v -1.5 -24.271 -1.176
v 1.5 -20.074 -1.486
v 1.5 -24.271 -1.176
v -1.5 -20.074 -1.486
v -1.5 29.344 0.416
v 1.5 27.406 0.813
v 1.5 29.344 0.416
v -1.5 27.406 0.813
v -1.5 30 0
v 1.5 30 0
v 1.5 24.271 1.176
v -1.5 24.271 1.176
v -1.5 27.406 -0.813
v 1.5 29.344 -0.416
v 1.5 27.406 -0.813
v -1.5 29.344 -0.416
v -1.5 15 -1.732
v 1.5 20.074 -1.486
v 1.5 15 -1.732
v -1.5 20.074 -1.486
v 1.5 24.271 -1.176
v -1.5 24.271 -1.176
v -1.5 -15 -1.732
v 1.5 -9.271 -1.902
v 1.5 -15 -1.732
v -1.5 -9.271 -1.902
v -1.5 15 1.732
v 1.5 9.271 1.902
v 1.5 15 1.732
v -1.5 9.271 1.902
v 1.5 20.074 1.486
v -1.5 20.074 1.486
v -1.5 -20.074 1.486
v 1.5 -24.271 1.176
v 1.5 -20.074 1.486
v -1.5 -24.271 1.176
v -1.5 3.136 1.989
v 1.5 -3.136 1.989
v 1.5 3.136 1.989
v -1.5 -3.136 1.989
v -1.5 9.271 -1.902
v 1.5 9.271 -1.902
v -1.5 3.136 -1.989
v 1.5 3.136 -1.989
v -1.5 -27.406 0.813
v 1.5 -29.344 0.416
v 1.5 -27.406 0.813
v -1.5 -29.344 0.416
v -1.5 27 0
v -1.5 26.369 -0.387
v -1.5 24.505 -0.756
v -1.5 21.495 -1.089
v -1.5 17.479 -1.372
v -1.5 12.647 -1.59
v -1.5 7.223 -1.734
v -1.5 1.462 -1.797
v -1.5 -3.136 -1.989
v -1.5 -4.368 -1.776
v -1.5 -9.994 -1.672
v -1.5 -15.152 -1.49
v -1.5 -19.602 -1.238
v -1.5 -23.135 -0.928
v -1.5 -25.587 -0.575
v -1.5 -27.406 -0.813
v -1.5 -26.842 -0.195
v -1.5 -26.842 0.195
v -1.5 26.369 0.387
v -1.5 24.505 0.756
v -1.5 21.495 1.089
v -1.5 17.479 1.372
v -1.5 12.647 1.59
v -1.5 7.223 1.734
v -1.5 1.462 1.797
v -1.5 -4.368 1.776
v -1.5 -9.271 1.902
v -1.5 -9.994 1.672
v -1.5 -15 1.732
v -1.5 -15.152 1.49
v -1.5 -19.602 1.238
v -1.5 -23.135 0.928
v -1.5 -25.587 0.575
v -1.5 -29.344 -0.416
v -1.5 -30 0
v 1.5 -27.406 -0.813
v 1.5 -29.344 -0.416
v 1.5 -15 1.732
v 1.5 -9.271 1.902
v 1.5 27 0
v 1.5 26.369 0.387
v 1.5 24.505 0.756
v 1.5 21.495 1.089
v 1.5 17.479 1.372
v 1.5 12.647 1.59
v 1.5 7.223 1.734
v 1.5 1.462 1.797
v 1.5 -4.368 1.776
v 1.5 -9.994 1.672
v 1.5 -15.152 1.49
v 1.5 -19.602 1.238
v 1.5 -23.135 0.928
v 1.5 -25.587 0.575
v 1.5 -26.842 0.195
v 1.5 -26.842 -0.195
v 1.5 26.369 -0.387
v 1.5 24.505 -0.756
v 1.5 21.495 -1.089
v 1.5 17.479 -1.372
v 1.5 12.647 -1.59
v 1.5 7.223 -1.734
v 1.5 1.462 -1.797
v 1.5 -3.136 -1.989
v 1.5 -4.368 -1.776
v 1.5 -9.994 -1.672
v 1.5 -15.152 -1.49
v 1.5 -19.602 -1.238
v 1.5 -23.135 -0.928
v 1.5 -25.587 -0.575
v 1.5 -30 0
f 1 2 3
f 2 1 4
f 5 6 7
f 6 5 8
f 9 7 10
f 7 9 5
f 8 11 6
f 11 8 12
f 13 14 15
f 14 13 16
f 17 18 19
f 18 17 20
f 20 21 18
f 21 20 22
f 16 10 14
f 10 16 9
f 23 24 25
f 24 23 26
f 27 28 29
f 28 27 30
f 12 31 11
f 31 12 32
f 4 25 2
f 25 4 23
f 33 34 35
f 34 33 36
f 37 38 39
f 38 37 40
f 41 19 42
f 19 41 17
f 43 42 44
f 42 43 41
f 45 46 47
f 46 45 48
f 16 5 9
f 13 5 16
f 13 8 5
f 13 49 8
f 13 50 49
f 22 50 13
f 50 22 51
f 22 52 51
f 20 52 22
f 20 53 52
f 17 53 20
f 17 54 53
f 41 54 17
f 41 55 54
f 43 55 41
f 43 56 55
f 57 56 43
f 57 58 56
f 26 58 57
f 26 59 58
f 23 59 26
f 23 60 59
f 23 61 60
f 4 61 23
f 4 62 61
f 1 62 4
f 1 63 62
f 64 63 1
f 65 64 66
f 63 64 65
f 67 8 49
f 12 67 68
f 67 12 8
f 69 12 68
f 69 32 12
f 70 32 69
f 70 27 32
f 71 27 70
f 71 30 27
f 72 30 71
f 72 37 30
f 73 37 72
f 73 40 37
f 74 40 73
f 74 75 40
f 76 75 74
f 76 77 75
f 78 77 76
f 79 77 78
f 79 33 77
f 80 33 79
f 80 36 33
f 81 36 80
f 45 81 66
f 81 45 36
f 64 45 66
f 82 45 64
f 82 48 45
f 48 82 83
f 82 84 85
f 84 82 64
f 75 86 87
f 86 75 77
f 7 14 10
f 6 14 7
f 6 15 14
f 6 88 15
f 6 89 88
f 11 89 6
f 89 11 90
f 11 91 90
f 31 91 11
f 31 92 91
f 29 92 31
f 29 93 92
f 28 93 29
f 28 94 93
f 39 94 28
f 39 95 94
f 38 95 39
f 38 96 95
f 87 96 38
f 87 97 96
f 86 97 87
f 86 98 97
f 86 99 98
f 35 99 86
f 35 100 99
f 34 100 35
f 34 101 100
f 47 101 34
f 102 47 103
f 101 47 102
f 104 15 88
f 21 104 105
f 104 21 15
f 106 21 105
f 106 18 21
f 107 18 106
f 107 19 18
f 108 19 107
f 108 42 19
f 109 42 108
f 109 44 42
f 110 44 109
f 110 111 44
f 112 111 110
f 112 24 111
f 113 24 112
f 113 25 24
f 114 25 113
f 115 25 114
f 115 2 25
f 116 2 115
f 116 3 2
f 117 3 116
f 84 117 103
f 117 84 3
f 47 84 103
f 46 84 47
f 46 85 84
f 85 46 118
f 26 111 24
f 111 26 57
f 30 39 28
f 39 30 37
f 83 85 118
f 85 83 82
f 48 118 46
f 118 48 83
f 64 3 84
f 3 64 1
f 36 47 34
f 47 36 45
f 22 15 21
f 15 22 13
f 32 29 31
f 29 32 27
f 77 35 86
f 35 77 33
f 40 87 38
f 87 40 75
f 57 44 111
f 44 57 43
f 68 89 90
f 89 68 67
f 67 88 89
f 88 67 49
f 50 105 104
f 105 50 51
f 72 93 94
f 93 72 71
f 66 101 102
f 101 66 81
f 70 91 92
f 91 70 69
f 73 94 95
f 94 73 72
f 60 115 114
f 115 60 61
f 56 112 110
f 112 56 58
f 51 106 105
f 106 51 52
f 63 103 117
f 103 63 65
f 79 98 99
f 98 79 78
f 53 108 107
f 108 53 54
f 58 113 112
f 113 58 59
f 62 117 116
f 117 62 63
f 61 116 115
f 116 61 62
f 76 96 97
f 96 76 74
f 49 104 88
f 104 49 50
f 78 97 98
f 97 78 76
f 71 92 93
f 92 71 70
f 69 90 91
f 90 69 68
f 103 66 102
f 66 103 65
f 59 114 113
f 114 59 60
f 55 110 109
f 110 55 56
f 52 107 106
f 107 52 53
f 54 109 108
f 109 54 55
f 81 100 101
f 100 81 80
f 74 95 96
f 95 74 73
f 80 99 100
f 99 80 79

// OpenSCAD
/**
* An edge (or line) between 2 nodes
*/
module line(start, end, d, fn=4) {
  hull() {
    node(start,d, fn);
    node(end,d, fn);
  }      
}

/**
* A single node which is connected by edges
*/
module node(pos, d, fn=4) {
  if (pos[0]!=undef && pos[1] != undef && pos[2] != undef){ 
    translate(pos) sphere(d=d, $fn = fn);    
  }
}

/**
* Basic logic for generating a 3d spring
*/ 
module spring(d, dBottom=6, dTop=6, windings=2, height=10, steps=10, wireDiameter=1,fn=10) {
    // we use either d or dBottom&dTop
    r0 = d != undef ? d/2 : dBottom/2;
    r1 = d != undef ?d/2 : dTop/2;
    
    rx = (r0-r1) / (360.0*windings);    
    heightPerDegree = height/windings/360;
    
    for ( angle = [steps : steps : 360*windings] ){
        r = r0 - (angle * rx); 
        x0=r*cos(angle-steps);
        y0=r*sin(angle-steps);
        z0=(angle-steps)*heightPerDegree;
        x=r*cos(angle);
        y=r*sin(angle);
        z=angle*heightPerDegree;

        line([x0,y0,z0],[x,y,z],d=wireDiameter,fn=fn);        
    }
}

/**
* 3D Spring with identical diameter at top and bottom. The top and boton might
* start with a flat circle
*/
module spring3D(d=5,windings=3,height=10,flatStart=true,flatEnd=true, wireDiameter=1,  fn=4) {  
    spring(d=d, windings=windings,height=height, fn=fn);
    
    if (flatStart)
        spring(dBottom=d,dTop=d,windings=1,height=0, fn=fn);
    if (flatEnd)
        translate([0,0,height]) spring(dBottom=d,dTop=d, windings=1,height=0, fn=fn);

}

/**
* Generate Support for the 3D Spring
*/
module spring3DSupport(d=5,height=10,supportDiameter=0.6, fn=4){
    // generate support
    dist=(d/2)*cos(0);
    translate([0,-dist,0])  cylinder(h=height,d=supportDiameter, $fn=fn);
    translate([0,dist,0])  cylinder(h=height,d=supportDiameter, $fn=fn);
}

/**
* Flat "clock" Spring
*/
module springSpiralTorsion(d=15,innerD=6, windings=5,wireDiameter=0.7,fn=4) {
    // outer ring
    spring(dBottom=d,dTop=d,windings=1,height=0,wireDiameter=wireDiameter,fn=fn);
    // windings
    spring(dBottom=d,dTop=innerD,windings=windings,height=0,wireDiameter=wireDiameter,fn=fn);
    // inner ring
    spring(dBottom=innerD,dTop=innerD,windings=1,height=0,wireDiameter=wireDiameter,fn=fn);
}

/**
* Flat 2d Spring with a sinusoidal shape
*/ 
module springSine(length=20, width=10, windings=4, steps=10, wireDiameter=0.7, fn=4){
    dx = length / (360 * windings);
    for(i = [steps : steps : 360 * windings]){
        x0 = (i-steps) * dx;
        y0 = sin(i-steps) * width/2;
        x = i * dx;
        y = sin(i) * width/2;        
        line([x0,y0,0],[x,y,0],d=wireDiameter,fn=fn);        
    }
}

/**
* Flat 2d Spring with a triangular shape
*/
module springTriangle(length=20, width=10, windings=4, wireDiameter=0.7, fn=4){
    // generate poins only every 90 degrees
    springSine(length=length,width=width, windings=windings, steps=90, wireDiameter=wireDiameter,fn=fn);
}

/**
* An edge (or line) between 2 cylinders
*/
module line3D(start, end,d=1,h=10, fn=4) {
  hull() {
    translate(start) cylinder(h=h, d=d, $fn = fn);    
    translate(end) cylinder(h=h, d=d, $fn = fn);    
  }      
}

/**
* 3d Spring with a sinusoidal shape
*/ 
module springSine3D(length=20, heigth=10, width=10, windings=4, steps=10, wireDiameter=0.7, fn=4){
    dx = length / (360 * windings);
    for(i = [steps : steps : 360 * windings]){
        x0 = (i-steps) * dx;
        y0 = sin(i-steps) * width/2;
        x = i * dx;
        y = sin(i) * width/2;        
        line3D([x0,y0,0],[x,y,0],d=wireDiameter,h=heigth, fn=fn);  
    }
}

/**
* 3d Spring - we generate an hollow Ellipse
*/ 
module springLeaf(width=3,len=10,height=5,thickness=1){
 rotate([90, 0, 90])
  scale([len/10,height/10,1]) 
  difference() {
     cylinder(h=width, r=10, center=true);
     cylinder(h=width+2, r=10-thickness, center=true);
  }
}

//spring3D();
//spring3DSupport();
//springSine3D();
//springTriangle();
//springSpiralTorsion();
springLeaf(3, 30, 2, 1);
